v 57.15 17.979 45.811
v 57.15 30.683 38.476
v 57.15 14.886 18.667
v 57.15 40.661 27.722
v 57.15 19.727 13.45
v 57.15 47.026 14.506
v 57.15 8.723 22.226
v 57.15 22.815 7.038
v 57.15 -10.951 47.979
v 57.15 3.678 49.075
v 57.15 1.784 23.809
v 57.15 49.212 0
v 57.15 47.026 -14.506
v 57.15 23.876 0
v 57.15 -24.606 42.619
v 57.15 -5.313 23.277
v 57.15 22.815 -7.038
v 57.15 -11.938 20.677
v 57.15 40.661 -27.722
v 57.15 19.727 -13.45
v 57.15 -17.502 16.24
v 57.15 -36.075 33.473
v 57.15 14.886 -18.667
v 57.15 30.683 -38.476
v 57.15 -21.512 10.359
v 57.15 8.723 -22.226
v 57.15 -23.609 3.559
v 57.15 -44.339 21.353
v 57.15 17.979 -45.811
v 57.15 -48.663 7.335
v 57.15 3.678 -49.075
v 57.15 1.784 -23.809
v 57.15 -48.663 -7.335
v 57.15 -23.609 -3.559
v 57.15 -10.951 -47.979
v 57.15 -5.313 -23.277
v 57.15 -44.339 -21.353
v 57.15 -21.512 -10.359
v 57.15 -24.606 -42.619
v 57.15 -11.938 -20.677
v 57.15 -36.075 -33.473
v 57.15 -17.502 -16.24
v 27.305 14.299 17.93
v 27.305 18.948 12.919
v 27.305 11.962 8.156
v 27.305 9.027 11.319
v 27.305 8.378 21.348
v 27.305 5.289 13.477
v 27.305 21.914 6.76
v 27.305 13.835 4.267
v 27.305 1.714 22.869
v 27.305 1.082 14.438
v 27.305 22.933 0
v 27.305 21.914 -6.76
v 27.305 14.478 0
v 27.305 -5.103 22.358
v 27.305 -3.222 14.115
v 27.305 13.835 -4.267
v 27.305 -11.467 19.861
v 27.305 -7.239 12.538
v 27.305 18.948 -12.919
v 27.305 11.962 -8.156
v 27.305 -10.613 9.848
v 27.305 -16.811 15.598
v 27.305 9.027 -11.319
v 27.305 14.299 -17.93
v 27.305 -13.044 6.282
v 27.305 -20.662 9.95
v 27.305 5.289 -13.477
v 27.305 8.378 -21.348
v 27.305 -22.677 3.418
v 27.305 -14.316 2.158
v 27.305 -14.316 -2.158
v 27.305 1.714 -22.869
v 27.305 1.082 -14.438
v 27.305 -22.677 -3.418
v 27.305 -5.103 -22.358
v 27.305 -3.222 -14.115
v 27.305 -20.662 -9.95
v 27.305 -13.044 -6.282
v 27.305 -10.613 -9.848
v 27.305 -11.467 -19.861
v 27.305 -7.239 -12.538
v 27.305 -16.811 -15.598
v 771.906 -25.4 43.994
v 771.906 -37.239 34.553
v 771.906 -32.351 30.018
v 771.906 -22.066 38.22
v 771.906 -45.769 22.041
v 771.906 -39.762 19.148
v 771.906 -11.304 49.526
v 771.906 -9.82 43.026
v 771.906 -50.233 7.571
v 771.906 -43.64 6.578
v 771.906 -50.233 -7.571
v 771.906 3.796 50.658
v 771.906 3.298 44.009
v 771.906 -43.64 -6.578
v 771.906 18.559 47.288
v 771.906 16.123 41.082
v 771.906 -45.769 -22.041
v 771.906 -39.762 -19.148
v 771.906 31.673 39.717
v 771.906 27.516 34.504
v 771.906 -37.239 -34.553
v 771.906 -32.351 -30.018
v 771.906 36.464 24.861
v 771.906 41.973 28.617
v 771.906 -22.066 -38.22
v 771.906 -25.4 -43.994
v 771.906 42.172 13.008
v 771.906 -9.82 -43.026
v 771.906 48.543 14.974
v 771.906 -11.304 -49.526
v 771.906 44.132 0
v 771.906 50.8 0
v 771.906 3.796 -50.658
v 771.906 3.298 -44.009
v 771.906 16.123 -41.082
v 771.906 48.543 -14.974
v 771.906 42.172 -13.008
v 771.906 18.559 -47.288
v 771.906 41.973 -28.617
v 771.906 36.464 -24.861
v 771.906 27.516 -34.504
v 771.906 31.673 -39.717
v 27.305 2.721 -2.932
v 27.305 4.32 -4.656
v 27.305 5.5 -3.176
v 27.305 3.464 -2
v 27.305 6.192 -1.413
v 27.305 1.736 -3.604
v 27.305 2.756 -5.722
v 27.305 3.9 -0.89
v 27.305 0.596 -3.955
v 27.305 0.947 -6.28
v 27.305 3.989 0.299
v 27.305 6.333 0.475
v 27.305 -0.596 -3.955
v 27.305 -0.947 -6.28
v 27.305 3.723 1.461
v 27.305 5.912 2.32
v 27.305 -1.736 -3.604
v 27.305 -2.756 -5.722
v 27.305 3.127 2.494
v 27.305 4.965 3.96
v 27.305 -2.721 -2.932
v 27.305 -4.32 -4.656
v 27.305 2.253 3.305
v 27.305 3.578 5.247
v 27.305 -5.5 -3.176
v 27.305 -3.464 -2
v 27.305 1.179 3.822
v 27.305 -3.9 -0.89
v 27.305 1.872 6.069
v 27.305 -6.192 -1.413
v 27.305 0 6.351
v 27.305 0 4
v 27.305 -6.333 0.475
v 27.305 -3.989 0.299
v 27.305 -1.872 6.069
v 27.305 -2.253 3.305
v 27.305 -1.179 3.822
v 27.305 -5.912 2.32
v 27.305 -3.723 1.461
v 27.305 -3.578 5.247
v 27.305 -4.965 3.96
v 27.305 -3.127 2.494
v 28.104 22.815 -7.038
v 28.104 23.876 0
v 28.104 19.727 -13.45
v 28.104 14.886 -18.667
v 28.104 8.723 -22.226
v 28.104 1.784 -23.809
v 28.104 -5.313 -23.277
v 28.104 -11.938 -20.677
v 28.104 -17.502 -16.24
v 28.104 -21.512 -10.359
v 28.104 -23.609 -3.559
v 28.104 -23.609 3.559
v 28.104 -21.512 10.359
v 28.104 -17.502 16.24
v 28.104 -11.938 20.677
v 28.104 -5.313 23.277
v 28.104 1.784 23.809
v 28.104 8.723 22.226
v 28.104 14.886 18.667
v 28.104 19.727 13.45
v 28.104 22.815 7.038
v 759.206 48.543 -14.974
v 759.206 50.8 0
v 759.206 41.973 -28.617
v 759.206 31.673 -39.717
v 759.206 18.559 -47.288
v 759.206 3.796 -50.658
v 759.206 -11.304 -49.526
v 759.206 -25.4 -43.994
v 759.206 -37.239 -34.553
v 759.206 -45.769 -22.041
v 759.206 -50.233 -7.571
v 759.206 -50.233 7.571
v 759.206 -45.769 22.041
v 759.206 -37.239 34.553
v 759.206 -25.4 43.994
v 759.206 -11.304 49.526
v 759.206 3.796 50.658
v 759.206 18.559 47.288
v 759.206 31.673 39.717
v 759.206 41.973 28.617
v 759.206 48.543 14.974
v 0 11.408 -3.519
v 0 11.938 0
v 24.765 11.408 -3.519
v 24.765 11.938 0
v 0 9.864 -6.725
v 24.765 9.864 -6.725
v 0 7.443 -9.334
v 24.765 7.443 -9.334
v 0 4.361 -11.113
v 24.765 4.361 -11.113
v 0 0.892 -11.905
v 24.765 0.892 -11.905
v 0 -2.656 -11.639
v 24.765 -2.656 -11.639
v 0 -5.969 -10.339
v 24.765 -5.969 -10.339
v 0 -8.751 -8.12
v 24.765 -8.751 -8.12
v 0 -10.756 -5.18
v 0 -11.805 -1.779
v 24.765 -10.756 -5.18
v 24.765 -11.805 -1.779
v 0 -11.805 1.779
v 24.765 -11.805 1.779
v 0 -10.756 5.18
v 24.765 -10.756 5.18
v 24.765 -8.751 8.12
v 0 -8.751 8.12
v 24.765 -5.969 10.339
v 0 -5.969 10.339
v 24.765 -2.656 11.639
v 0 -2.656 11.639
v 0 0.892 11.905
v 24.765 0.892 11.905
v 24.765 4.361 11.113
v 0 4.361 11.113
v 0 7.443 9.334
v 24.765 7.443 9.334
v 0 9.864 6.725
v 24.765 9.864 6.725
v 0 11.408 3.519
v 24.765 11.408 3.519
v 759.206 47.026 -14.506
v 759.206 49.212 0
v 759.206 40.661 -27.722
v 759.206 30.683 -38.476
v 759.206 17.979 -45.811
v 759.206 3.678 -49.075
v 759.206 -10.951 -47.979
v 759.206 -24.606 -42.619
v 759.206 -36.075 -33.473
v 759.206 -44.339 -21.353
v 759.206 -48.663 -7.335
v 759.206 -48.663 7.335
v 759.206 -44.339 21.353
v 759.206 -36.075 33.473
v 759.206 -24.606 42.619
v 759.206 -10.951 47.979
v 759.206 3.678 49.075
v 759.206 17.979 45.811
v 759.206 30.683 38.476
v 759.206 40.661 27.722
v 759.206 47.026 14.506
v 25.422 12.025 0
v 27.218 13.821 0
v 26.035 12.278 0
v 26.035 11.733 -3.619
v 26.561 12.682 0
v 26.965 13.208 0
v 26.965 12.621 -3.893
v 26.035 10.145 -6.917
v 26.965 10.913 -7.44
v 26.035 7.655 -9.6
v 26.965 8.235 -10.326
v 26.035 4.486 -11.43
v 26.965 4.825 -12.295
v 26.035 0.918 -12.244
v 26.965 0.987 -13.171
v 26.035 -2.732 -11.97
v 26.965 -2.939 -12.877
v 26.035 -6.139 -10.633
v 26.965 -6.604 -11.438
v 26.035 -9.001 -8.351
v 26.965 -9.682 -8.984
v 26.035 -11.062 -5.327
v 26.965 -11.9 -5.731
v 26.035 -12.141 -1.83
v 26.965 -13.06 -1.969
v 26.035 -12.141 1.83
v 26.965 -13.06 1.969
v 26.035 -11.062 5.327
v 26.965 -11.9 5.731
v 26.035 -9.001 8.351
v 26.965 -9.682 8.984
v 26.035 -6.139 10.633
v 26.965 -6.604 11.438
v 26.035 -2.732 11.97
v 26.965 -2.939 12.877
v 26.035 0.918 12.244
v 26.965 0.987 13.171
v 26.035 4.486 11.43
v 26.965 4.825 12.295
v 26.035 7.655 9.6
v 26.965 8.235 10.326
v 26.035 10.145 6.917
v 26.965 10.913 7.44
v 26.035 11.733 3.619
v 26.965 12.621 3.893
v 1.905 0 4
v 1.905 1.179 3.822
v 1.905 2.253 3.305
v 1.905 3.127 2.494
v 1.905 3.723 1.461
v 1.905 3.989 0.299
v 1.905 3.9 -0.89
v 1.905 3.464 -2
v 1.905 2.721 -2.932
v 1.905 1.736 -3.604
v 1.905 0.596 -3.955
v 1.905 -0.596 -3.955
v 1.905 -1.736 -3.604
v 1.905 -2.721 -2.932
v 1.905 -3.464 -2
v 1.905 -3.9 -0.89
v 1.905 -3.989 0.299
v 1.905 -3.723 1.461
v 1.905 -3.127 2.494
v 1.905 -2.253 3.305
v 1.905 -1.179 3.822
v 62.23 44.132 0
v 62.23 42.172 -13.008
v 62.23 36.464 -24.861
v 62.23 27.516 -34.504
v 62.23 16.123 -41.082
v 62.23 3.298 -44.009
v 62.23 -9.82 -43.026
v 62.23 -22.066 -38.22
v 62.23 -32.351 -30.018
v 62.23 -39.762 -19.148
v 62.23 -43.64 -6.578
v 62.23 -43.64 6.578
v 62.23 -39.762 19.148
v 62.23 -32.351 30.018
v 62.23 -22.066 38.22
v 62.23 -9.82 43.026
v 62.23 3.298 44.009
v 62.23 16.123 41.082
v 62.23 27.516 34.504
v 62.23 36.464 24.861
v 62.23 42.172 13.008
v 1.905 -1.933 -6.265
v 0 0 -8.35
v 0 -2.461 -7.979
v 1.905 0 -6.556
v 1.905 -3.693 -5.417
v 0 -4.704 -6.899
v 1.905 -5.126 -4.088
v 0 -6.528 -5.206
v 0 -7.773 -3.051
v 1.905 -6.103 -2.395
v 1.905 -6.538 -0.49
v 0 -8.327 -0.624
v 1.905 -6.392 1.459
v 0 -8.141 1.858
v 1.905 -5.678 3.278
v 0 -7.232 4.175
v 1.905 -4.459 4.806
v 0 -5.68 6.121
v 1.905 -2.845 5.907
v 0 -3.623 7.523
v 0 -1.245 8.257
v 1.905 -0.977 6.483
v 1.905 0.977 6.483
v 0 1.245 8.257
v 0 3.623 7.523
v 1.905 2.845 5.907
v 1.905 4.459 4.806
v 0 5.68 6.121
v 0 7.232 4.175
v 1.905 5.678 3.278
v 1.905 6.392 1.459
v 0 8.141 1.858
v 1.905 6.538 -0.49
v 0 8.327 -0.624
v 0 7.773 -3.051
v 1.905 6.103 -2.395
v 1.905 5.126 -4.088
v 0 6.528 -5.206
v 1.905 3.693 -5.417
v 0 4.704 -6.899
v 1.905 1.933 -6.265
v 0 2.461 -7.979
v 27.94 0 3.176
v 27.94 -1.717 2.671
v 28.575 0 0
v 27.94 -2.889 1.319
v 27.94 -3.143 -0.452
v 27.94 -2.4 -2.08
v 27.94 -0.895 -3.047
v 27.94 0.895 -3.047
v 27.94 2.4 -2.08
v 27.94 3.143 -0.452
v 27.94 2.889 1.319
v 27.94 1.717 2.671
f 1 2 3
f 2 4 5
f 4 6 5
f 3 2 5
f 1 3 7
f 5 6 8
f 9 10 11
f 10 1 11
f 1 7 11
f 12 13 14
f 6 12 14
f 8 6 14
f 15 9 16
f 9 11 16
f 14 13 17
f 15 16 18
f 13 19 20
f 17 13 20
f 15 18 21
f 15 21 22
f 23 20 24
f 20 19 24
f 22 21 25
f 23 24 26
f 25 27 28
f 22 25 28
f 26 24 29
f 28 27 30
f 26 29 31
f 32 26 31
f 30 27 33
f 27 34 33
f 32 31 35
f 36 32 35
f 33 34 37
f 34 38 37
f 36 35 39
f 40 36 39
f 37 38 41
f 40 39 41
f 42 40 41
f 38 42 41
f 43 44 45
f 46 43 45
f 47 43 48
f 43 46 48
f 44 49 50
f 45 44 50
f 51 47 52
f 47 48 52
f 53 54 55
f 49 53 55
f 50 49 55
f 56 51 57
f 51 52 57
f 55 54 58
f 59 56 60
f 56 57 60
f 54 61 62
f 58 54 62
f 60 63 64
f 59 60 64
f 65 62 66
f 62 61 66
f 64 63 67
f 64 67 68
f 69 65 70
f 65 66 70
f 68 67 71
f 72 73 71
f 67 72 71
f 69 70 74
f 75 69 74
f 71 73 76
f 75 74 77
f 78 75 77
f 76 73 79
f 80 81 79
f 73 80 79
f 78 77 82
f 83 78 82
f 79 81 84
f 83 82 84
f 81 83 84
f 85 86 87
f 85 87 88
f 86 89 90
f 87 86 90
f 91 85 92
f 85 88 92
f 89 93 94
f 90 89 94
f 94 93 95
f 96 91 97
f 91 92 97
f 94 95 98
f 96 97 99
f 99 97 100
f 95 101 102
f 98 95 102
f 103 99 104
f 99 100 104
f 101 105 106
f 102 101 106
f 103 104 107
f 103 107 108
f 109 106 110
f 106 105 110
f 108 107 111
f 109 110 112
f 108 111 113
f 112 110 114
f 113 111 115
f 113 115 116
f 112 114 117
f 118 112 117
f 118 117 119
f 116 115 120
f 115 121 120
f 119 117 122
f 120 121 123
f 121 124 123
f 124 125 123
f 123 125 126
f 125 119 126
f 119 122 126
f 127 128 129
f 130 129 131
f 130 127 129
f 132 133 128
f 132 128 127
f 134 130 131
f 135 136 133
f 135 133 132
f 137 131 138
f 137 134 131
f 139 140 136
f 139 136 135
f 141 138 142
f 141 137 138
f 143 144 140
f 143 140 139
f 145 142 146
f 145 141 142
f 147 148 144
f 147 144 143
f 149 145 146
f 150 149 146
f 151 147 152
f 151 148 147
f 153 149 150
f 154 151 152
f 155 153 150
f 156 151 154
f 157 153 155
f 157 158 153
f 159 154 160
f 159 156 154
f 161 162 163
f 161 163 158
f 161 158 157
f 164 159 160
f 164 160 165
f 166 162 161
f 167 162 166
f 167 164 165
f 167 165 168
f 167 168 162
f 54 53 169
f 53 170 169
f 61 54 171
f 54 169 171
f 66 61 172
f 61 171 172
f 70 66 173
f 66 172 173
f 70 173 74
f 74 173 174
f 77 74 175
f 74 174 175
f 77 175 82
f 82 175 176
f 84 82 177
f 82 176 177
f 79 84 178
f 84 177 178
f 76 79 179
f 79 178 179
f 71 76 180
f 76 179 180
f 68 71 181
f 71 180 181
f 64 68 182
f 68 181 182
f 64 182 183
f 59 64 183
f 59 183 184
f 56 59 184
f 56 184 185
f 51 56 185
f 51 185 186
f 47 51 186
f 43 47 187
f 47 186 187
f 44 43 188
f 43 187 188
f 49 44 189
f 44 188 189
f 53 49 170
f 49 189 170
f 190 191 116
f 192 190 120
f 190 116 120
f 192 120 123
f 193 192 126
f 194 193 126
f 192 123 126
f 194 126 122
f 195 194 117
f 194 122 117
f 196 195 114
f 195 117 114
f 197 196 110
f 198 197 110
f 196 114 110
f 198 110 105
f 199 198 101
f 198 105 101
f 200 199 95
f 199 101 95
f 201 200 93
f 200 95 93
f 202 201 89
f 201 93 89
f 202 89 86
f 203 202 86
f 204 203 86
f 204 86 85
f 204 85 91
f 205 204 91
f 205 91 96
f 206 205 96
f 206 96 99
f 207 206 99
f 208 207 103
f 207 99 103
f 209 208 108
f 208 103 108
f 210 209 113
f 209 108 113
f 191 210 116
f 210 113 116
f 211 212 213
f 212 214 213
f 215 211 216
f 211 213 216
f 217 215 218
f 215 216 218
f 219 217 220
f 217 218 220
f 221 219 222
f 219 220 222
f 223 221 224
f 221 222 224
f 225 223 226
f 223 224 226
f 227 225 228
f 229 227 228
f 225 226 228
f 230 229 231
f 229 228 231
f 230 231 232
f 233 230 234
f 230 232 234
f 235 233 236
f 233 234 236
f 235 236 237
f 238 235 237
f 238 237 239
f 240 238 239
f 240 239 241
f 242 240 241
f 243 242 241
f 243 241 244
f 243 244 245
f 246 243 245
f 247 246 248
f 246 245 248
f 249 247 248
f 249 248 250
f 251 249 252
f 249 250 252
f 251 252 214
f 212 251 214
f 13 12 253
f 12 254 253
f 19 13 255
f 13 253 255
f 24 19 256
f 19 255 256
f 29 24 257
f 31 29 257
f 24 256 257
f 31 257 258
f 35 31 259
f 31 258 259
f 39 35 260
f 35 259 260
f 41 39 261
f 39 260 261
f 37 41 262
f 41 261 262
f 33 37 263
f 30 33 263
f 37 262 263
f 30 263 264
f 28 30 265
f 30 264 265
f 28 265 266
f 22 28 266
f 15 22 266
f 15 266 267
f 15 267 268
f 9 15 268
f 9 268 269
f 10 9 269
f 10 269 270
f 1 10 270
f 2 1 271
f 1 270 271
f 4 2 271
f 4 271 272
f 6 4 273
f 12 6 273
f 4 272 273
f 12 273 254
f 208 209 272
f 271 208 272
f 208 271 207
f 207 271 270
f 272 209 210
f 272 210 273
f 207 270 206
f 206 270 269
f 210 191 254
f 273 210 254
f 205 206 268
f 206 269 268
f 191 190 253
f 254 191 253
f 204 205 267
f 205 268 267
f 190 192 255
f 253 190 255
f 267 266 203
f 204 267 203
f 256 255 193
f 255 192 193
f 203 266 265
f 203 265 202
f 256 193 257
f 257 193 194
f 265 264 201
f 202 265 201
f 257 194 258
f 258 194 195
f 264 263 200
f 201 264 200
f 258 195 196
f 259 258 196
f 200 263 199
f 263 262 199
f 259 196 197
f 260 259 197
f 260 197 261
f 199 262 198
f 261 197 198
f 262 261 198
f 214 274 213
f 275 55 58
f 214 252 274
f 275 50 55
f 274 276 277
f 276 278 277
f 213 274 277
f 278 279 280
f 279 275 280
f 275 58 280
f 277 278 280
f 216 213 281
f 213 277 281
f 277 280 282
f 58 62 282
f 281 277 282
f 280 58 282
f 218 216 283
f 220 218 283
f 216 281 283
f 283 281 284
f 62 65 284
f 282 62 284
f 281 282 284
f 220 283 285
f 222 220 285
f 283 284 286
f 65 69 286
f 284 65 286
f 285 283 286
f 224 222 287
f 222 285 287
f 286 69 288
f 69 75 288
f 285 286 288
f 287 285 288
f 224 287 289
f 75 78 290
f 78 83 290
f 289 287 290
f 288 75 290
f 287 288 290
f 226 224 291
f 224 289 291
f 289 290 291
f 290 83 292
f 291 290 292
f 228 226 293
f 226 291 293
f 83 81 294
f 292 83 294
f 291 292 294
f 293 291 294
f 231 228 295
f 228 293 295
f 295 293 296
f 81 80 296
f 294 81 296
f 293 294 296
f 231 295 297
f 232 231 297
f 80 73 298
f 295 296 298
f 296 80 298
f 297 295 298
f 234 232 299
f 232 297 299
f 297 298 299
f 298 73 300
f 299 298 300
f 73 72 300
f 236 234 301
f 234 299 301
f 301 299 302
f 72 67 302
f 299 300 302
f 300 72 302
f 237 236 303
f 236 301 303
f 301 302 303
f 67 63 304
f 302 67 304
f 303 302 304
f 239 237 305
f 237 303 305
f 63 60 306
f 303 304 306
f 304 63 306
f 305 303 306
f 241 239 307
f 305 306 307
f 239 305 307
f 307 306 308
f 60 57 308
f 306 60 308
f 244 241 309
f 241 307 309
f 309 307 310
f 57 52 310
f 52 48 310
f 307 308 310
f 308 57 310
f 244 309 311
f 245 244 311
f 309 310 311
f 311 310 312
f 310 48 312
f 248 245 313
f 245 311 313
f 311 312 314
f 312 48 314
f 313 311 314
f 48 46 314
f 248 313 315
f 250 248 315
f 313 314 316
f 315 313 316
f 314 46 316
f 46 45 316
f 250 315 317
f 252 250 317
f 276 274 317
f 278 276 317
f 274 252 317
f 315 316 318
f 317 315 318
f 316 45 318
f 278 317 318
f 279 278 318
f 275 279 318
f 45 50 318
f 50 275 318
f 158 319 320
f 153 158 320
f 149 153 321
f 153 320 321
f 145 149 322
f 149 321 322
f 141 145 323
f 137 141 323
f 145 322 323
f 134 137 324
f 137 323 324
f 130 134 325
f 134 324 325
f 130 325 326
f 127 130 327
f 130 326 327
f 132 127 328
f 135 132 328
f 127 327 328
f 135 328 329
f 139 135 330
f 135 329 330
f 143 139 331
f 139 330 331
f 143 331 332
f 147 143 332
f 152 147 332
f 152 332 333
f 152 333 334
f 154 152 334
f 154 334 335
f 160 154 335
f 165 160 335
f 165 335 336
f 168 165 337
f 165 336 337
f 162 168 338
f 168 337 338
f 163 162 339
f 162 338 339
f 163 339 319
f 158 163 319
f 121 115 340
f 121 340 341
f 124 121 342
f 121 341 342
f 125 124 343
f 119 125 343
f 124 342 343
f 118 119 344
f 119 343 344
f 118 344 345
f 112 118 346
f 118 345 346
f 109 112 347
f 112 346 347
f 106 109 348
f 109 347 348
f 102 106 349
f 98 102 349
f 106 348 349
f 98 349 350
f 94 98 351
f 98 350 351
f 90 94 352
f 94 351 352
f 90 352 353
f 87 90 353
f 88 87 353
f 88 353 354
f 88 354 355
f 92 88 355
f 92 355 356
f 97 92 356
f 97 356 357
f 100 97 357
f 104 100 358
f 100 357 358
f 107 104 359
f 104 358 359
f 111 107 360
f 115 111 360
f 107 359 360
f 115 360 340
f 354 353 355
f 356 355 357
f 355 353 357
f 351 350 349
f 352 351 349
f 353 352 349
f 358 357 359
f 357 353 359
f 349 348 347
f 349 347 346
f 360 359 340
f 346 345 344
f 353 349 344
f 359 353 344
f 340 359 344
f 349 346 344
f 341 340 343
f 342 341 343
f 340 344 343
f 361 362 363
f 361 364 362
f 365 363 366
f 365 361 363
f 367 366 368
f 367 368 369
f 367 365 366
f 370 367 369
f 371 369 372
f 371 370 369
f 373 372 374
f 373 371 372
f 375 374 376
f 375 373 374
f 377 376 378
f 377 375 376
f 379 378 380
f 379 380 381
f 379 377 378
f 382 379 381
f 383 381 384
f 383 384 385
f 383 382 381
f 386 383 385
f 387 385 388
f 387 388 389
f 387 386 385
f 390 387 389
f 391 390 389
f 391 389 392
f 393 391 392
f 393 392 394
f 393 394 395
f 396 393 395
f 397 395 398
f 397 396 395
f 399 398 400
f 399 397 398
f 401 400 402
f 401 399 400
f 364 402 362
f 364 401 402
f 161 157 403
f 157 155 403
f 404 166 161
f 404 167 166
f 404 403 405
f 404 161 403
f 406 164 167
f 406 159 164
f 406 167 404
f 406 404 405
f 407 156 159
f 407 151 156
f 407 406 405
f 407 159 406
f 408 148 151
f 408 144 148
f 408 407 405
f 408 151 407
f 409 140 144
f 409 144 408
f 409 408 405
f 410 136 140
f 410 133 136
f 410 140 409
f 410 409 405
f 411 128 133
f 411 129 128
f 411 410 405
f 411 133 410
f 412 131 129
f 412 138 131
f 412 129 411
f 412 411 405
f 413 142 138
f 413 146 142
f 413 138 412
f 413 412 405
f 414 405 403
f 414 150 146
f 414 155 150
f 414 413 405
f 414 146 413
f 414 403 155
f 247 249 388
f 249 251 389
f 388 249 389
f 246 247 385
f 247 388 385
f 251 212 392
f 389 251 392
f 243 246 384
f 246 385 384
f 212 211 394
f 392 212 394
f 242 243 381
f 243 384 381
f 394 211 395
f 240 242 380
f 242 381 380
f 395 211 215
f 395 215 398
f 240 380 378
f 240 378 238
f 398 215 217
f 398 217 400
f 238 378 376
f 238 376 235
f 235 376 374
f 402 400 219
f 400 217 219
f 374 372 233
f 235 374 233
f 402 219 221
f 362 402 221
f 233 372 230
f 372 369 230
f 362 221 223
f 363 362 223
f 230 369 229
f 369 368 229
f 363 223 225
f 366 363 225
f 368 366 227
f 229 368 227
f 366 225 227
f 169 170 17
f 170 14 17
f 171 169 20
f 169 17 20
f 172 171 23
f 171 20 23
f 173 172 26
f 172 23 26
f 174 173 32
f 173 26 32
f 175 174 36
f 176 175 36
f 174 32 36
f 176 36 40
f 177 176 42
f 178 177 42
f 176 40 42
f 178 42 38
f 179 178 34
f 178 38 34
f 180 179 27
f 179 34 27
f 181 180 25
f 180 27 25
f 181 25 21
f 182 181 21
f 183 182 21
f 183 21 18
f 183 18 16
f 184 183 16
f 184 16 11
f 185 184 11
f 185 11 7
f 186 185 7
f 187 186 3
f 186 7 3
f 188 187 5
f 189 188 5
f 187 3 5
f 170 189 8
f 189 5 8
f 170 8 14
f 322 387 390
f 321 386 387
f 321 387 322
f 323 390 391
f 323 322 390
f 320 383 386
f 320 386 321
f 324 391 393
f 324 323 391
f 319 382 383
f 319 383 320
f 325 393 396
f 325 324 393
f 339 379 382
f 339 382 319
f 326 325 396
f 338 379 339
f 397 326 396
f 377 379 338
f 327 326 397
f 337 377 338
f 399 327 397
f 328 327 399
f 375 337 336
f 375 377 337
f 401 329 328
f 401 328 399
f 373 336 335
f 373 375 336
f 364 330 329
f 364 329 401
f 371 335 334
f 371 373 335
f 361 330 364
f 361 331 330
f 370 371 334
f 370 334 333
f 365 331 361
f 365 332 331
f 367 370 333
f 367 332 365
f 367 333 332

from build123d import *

# Parameters (mm, degrees)
SKETCH19_R         = 4
CUT_EXTRUDE3_DEPTH = 25.4


with BuildPart() as part:
    # Sketch1 → Revolve1 (revolve)
    with BuildSketch(Plane.XY):
        with BuildLine():
            Line((0, 0), (0, 11.938))
            Line((0, 11.938), (24.765, 11.938))
            ThreePointArc((24.765, 11.938), (26.561051224, 12.681948776), (27.305, 14.478))
            Line((27.305, 14.478), (27.305, 22.933028409))
            Line((27.305, 22.933028409), (28.104406531, 23.876))
            Line((28.104406531, 23.876), (57.15, 23.876))
            Line((57.15, 23.876), (57.15, 49.2125))
            Line((57.15, 49.2125), (759.206, 49.2125))
            Line((759.206, 49.2125), (759.206, 50.8))
            Line((759.206, 50.8), (771.906, 50.8))
            Line((771.906, 50.8), (771.906, 49.2125))
            Line((771.906, 49.2125), (771.906, 44.1325))
            Line((771.906, 44.1325), (62.23, 44.1325))
            Line((62.23, 44.1325), (62.23, 0))
            Line((62.23, 0), (0, 0))
        make_face()
    revolve(axis=Axis((62.23, 0, 0), (-1, 0, 0)))

    # Sketch16 → Cut-Revolve1 (revolve, cut)
    with BuildSketch(Plane(origin=(0, 0, 0), x_dir=(1, 0, 0), z_dir=(0, 1, 0))):
        Polygon((0, 0), (0, 8.35025), (1.905, 6.556375), (1.905, 0), align=None)
    revolve(axis=Axis((1.905, 0, 0), (-1, 0, 0)), mode=Mode.SUBTRACT)

    # Sketch19 → Cut-Extrude3 (cut)
    with BuildSketch(Plane.ZY.offset(-1.905)):
        Circle(SKETCH19_R)
    extrude(amount=-CUT_EXTRUDE3_DEPTH, mode=Mode.SUBTRACT)

    # Sketch32 → Cut-Revolve6 (revolve, cut)
    with BuildSketch(Plane(origin=(0, 0, 0), x_dir=(1, 0, 0), z_dir=(0, 1, 0)), mode=Mode.PRIVATE) as cut_revolve6_sk:
        Polygon((27.305, 0), (28.575, 0), (27.305, 6.351059428), align=None)
    revolve(cut_revolve6_sk.sketch.rotate(Axis((27.305, 0, 0), (1, 0, 0)), 180), axis=Axis((27.305, 0, 0), (1, 0, 0)), mode=Mode.SUBTRACT)


solid = part.part
